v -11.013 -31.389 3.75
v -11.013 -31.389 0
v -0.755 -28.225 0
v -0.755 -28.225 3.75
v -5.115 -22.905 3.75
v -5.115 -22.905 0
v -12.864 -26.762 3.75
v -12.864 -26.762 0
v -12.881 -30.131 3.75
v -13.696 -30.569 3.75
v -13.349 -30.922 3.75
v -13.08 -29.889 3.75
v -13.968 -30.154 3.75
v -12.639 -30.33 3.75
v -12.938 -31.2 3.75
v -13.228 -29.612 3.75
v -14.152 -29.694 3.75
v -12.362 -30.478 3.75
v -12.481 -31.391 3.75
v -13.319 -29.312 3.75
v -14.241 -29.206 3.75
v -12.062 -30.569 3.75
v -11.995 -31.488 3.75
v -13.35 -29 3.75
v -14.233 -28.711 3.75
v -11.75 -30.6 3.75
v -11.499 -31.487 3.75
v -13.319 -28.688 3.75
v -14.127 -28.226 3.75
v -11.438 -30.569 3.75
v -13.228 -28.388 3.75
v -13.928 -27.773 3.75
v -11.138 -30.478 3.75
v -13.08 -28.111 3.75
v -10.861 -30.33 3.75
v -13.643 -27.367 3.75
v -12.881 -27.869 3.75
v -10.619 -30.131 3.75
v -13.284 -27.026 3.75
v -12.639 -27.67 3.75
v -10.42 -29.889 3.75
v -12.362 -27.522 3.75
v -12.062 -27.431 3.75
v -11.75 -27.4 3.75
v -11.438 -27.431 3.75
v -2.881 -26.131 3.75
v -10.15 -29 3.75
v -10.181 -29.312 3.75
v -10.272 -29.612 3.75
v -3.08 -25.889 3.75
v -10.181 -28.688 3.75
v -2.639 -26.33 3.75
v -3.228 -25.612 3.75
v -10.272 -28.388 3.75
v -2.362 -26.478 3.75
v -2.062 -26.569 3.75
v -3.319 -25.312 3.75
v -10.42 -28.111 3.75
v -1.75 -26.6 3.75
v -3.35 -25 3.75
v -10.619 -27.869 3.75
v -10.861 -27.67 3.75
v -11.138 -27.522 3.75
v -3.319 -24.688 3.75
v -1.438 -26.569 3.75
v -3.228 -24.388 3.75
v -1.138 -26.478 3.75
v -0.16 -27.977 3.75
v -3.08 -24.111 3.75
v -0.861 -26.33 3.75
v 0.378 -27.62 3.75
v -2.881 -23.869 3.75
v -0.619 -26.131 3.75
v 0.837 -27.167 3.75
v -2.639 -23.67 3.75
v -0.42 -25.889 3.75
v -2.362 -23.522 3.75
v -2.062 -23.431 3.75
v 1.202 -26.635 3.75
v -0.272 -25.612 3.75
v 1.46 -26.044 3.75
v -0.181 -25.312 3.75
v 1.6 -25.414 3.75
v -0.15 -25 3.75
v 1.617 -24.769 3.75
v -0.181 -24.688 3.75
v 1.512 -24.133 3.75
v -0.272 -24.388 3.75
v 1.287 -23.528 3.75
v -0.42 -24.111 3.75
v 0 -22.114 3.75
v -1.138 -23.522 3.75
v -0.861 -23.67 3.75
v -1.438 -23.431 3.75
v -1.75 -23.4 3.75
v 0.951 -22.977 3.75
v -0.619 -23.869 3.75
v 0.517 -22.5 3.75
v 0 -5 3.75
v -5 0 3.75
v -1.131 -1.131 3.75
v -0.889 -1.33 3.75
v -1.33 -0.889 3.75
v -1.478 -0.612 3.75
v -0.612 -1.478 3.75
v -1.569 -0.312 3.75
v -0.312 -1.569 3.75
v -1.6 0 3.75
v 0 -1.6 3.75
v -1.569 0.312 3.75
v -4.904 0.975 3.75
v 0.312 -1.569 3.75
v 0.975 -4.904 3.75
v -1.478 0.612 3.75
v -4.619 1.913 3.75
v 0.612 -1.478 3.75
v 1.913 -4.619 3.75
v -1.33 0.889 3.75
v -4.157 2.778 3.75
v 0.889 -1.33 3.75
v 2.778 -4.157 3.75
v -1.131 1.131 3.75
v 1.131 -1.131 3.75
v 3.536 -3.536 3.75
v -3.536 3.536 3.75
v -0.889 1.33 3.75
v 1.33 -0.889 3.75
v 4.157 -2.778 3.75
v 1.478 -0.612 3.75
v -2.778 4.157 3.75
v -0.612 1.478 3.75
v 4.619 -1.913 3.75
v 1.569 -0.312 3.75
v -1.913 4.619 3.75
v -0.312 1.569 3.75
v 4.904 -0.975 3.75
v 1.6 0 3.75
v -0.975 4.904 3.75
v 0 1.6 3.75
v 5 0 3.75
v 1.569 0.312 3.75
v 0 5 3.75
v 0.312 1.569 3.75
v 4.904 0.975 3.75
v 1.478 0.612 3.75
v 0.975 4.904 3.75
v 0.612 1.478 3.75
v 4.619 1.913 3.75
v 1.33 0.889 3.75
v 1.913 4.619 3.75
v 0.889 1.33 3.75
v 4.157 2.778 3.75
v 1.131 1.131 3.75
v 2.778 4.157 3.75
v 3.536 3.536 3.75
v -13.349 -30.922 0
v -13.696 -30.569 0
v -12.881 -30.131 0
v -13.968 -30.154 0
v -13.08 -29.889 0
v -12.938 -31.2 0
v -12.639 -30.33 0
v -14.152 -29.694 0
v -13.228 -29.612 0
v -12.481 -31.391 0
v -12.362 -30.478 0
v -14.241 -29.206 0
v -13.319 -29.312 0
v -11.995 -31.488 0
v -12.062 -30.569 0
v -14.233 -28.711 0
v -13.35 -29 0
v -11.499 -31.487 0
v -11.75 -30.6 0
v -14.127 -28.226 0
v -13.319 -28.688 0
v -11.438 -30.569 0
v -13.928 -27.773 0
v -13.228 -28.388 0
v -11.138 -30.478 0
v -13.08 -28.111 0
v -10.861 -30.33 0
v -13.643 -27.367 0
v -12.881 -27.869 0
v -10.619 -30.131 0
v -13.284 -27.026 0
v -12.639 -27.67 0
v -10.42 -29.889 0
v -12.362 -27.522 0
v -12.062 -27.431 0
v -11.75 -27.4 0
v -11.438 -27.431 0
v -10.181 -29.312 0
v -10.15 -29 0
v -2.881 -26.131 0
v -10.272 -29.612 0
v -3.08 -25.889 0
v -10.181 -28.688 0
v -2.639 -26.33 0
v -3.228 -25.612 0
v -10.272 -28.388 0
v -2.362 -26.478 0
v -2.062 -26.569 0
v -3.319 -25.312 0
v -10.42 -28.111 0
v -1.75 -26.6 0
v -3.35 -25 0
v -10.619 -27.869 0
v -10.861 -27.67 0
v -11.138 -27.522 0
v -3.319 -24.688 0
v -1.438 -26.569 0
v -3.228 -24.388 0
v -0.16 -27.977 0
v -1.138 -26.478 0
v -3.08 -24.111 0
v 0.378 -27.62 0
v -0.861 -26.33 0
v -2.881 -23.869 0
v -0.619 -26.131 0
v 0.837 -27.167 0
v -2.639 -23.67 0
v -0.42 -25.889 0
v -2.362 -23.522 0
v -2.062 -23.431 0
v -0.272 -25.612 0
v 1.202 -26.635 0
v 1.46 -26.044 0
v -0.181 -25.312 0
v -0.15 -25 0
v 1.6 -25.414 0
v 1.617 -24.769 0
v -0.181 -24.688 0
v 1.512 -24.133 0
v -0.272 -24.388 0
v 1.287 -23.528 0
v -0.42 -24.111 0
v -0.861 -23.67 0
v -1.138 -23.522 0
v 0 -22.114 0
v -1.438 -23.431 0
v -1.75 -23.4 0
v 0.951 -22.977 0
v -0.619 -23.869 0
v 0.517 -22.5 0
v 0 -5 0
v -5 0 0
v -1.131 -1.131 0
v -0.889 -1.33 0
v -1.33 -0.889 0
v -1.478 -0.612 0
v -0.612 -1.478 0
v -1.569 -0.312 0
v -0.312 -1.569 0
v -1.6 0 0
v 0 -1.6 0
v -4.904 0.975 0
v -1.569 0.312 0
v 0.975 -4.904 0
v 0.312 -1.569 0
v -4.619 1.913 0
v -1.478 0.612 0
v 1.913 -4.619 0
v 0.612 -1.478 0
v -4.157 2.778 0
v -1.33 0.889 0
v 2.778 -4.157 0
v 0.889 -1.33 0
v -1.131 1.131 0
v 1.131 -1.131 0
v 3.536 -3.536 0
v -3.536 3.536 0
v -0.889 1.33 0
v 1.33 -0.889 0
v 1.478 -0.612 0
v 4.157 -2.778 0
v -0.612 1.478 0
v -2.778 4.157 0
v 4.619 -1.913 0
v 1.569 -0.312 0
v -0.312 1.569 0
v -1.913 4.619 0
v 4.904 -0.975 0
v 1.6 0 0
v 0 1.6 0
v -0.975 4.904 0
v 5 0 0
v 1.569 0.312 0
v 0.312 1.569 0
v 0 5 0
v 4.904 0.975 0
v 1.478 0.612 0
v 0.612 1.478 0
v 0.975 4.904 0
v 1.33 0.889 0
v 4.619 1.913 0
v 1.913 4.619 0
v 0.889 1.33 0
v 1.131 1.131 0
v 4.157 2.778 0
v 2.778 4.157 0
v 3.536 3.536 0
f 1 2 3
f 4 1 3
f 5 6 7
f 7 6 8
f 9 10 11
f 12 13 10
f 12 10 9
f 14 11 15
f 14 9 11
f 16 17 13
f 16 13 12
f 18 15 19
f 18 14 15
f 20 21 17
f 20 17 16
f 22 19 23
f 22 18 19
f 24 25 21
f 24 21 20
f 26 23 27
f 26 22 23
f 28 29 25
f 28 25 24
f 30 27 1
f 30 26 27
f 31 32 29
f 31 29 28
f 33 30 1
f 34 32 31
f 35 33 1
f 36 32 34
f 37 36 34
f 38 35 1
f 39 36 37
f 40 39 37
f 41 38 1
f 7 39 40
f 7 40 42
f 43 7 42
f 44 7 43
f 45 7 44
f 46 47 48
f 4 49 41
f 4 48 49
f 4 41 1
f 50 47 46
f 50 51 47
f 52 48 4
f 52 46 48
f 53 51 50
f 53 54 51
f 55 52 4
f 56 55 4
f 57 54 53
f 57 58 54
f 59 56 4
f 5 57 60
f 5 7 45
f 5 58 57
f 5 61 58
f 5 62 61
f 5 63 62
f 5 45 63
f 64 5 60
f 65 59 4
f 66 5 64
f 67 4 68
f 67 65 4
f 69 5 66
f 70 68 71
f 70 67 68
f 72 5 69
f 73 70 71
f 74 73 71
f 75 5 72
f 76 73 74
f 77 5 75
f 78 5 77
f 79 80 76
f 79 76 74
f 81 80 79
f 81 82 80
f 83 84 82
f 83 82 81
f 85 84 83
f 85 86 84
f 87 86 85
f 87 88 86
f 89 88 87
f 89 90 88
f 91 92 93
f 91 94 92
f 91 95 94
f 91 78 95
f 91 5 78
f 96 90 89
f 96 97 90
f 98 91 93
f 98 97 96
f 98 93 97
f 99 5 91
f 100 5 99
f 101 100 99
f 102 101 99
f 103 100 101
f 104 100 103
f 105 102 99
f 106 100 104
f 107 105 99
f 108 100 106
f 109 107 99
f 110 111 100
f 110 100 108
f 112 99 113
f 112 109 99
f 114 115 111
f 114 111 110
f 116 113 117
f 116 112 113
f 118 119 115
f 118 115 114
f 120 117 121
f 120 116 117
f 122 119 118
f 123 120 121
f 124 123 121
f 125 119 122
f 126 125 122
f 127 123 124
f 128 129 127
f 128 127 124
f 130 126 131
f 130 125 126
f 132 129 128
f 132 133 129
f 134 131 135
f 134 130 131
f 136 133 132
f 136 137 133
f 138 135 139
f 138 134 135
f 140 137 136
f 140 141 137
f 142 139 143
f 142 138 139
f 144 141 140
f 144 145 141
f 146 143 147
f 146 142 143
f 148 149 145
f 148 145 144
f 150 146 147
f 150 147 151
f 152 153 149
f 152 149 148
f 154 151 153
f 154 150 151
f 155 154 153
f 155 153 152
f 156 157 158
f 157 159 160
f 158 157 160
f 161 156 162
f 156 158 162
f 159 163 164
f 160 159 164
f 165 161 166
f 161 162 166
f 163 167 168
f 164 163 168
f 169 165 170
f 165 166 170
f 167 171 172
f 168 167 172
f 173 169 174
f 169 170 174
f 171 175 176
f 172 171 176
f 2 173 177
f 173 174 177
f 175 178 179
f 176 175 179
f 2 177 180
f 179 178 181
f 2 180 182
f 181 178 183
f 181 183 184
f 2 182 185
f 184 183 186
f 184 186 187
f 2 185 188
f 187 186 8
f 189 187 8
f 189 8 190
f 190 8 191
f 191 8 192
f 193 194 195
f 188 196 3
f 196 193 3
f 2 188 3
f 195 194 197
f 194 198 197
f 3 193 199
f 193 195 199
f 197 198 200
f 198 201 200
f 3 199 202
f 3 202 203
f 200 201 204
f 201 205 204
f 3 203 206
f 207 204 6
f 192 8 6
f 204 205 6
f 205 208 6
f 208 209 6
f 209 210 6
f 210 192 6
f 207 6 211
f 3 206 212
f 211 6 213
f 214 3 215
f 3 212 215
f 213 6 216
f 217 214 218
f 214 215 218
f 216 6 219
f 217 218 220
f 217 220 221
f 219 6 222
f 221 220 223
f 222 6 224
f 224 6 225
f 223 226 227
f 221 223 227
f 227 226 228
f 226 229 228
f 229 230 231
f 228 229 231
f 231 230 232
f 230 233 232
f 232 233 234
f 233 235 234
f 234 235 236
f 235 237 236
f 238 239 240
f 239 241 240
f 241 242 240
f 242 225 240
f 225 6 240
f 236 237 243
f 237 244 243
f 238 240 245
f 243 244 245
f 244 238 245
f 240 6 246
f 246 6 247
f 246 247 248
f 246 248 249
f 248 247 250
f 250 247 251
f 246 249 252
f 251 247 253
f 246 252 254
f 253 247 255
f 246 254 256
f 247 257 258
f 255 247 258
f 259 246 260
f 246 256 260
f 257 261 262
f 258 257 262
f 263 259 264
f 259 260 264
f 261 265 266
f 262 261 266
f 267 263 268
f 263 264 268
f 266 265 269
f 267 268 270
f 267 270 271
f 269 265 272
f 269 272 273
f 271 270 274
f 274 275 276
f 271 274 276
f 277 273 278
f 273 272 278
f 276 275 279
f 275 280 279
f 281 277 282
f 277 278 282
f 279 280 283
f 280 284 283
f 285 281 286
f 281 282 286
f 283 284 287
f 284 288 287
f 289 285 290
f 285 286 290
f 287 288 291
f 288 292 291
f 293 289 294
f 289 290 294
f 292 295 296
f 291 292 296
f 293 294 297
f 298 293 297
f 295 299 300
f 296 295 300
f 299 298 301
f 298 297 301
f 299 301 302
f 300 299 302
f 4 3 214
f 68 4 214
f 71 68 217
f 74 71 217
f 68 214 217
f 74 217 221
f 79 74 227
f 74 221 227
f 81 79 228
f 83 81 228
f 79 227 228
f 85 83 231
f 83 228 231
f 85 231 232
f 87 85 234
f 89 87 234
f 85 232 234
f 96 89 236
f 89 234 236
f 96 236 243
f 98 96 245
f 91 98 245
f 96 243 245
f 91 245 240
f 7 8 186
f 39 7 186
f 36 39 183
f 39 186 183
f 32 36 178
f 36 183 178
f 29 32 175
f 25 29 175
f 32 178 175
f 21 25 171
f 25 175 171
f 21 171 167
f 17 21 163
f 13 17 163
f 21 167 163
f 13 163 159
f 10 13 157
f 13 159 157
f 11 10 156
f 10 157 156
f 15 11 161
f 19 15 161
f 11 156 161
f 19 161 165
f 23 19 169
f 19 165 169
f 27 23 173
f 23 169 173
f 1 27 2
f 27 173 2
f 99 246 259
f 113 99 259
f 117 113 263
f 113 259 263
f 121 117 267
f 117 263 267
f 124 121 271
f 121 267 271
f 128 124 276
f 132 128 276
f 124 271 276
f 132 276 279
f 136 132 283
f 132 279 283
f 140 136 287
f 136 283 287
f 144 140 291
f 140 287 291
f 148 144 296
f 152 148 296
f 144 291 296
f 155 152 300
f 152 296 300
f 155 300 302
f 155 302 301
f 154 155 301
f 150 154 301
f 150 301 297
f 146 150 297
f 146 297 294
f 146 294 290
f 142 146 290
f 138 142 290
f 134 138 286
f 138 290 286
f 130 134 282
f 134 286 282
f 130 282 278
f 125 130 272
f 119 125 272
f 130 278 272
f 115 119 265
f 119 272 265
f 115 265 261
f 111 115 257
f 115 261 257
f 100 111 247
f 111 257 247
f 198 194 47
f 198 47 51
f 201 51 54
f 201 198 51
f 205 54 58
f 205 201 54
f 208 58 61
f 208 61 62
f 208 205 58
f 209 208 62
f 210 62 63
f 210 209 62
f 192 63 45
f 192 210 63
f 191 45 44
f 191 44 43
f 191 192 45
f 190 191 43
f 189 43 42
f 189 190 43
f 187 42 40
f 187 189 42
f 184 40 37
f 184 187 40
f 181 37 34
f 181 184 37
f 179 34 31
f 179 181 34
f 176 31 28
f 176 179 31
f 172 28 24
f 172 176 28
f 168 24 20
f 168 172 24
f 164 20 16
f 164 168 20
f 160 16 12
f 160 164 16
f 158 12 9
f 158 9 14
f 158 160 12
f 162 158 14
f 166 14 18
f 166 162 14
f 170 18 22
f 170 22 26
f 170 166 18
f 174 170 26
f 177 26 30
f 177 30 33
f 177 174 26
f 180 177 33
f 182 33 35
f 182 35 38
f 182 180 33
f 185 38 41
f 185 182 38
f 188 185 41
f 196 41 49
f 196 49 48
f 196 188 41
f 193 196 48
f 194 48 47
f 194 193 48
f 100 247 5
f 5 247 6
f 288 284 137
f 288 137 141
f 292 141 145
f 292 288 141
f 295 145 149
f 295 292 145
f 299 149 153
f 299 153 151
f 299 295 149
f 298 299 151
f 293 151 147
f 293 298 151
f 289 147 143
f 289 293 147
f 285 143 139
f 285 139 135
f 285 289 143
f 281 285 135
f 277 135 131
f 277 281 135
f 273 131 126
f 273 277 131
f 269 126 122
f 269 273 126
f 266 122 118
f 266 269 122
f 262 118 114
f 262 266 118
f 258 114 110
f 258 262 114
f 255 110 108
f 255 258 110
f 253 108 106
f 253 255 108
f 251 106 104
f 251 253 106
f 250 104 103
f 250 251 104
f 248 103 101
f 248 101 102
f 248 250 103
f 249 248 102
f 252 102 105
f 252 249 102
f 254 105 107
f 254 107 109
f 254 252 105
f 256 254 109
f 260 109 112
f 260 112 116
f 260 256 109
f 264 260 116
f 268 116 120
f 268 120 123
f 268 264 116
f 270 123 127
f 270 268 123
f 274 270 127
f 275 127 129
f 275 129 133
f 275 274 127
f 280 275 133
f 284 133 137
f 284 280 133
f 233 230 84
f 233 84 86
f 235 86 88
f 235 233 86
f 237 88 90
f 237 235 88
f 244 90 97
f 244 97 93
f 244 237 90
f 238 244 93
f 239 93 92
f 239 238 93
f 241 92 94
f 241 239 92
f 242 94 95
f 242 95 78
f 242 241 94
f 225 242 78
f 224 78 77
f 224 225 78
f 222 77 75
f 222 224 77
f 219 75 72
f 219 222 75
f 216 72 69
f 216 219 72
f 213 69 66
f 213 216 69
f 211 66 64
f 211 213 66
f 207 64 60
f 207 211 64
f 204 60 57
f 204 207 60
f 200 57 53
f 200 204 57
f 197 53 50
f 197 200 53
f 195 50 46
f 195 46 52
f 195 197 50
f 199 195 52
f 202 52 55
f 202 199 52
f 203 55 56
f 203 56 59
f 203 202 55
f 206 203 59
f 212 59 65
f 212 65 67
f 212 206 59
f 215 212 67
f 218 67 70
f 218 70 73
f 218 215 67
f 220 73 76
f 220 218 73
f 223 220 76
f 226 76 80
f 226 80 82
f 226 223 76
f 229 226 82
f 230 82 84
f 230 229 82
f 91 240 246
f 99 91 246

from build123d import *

# Parameters (mm, degrees)
SKETCH1_R           = 1.6
BOSS_EXTRUDE1_DEPTH = 3.75


with BuildPart() as part:
    # Sketch1 → Boss-Extrude1 (new body)
    with BuildSketch(Plane.XY):
        with BuildLine():
            Line((0, -22.114150905), (0, -5))
            ThreePointArc((0, -5), (3.535533906, 3.535533906), (-5, 0))
            Line((-5, 0), (-5.114562262, -22.904716871))
            Line((-5.114562262, -22.904716871), (-12.863985131, -26.761912172))
            ThreePointArc((-12.863985131, -26.761912172), (-14.071191727, -29.928476691), (-11.013170041, -31.388949897))
            Line((-11.013170041, -31.388949897), (-0.755279555, -28.225082361))
            ThreePointArc((-0.755279555, -28.225082361), (1.599513904, -25.413982613), (0, -22.114150905))
        make_face()
        Circle(SKETCH1_R, mode=Mode.SUBTRACT)
        with Locations((-1.75, -25)):
            Circle(SKETCH1_R, mode=Mode.SUBTRACT)
        with Locations((-11.75, -29)):
            Circle(SKETCH1_R, mode=Mode.SUBTRACT)
    extrude(amount=BOSS_EXTRUDE1_DEPTH)


solid = part.part
